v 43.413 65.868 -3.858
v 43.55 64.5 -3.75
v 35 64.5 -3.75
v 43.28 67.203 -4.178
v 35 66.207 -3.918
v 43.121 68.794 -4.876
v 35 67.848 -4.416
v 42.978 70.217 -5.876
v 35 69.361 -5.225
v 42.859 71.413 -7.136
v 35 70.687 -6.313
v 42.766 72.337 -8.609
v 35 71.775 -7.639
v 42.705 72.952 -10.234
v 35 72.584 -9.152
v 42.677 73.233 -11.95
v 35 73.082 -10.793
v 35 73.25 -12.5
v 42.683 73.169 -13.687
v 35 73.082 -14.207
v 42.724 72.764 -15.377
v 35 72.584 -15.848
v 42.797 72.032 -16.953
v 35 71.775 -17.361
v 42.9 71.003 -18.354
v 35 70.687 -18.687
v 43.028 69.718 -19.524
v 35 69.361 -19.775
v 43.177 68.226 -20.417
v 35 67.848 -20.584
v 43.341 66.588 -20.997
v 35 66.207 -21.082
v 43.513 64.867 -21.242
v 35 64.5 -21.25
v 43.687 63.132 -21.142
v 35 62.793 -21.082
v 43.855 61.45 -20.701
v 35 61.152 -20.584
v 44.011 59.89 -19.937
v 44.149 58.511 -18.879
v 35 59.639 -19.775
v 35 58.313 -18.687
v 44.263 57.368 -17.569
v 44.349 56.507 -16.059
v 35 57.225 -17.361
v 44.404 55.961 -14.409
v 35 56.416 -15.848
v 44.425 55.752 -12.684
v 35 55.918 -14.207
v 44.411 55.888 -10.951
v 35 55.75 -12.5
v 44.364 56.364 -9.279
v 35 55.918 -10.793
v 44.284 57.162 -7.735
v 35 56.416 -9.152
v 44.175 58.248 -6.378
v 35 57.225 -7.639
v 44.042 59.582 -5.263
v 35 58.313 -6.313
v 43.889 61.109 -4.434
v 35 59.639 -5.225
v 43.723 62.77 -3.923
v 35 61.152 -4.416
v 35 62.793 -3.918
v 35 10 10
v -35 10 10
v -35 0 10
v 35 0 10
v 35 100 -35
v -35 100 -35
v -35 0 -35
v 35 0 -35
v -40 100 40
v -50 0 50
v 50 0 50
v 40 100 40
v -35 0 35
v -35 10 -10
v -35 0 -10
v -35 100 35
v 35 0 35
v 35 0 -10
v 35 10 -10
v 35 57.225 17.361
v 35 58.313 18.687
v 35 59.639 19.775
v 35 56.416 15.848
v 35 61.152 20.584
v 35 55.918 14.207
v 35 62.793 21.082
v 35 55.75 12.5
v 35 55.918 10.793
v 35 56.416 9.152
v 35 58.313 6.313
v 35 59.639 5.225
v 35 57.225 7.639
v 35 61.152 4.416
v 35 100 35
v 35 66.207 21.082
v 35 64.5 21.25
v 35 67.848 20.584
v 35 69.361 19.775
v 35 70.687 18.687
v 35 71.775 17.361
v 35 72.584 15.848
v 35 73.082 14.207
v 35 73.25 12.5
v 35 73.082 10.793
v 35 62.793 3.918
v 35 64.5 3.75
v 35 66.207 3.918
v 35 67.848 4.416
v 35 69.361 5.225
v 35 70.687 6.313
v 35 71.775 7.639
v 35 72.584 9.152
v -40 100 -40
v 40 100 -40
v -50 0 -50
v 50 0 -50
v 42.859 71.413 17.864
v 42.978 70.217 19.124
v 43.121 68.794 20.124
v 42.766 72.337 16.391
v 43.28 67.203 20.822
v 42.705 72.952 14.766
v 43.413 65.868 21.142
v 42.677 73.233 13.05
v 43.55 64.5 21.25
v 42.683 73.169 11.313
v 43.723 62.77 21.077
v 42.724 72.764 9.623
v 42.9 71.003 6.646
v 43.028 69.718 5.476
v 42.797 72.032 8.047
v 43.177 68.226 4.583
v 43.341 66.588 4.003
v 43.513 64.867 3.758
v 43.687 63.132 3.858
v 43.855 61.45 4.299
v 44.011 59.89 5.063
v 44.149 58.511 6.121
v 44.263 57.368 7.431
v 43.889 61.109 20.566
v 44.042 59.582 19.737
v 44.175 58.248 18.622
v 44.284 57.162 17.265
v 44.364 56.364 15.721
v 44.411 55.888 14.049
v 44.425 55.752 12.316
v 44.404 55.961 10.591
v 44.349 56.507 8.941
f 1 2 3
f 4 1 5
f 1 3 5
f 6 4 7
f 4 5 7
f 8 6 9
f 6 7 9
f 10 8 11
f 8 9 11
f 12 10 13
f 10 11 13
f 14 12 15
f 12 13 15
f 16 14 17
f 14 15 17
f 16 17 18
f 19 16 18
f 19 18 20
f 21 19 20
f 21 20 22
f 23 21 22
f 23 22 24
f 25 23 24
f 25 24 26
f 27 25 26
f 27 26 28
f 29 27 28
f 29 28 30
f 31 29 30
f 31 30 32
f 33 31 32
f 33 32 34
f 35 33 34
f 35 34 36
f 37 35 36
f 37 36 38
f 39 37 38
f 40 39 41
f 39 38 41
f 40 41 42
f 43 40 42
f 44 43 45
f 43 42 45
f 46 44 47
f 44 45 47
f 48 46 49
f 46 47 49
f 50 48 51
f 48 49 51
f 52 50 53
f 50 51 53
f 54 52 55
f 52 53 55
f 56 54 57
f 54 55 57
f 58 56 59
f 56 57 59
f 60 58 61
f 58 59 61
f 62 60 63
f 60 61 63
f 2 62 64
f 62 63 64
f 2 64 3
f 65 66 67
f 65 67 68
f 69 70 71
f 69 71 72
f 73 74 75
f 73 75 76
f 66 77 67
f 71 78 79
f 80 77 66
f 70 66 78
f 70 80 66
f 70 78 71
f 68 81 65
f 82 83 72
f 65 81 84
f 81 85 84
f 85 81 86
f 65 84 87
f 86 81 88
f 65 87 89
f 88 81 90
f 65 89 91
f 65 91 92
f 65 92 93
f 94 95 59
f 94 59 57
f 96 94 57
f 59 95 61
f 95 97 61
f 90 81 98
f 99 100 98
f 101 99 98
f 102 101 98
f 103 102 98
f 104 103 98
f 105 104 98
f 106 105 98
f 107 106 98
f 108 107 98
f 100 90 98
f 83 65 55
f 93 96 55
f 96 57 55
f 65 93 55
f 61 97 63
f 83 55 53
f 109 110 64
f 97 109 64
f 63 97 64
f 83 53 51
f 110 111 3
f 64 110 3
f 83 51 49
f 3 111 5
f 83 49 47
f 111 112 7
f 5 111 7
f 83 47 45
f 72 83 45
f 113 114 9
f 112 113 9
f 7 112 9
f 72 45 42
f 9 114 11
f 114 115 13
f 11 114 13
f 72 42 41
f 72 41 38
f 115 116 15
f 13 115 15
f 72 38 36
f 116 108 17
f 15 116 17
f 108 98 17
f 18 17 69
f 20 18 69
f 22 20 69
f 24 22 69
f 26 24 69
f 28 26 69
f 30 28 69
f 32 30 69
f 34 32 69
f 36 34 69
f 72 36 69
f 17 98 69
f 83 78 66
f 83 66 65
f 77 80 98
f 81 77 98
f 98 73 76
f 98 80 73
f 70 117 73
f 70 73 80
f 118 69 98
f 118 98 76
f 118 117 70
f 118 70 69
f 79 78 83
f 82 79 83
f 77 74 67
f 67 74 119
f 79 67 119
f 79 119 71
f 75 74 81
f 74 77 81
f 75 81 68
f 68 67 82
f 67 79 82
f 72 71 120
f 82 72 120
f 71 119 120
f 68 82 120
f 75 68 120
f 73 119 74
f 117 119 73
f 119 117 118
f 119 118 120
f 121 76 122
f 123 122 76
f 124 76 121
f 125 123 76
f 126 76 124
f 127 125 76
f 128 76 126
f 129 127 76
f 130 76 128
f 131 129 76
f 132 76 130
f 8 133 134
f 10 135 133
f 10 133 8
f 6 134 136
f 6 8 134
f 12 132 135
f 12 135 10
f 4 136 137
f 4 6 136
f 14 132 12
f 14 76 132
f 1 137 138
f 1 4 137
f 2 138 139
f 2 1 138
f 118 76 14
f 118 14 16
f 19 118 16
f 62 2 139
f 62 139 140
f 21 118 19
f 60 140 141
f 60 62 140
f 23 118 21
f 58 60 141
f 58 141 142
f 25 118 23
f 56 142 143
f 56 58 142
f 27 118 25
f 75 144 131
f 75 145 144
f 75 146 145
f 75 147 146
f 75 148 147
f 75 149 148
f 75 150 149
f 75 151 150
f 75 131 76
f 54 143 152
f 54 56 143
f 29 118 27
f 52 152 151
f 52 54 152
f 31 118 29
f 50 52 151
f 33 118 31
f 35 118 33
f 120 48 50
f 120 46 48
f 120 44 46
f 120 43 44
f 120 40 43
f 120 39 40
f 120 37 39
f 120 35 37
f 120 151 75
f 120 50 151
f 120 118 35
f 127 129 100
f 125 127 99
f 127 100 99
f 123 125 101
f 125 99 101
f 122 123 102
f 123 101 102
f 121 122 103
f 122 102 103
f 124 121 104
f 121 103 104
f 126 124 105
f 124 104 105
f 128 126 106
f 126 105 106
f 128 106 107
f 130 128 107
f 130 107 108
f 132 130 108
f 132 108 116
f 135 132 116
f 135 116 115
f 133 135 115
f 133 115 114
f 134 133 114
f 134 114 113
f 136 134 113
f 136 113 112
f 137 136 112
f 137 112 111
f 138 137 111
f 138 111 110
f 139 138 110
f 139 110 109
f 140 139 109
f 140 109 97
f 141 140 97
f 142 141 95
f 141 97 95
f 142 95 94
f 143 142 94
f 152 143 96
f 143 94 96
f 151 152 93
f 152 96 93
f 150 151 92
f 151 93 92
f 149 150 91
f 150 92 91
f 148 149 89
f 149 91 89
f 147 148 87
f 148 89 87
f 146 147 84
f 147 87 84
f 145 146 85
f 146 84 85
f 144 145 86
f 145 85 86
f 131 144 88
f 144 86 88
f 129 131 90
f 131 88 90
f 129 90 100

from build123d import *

# Parameters (mm, degrees)
ESBO_O1_W                = 100
ESBO_O1_H                = 100
RESSALTO_EXTRUS_O1_DEPTH = 100
CHANFRO1_START           = -50
CHANFRO1_DEPTH           = 100
CHANFRO1_START_2         = -51
CHANFRO1_2_DEPTH         = 102
ESBO_O3_W                = 70
ESBO_O3_H                = 25
CORTE_EXTRUS_O1_DEPTH    = 123.474487139
ESBO_O4_W                = 70
ESBO_O4_H                = 20
CORTE_EXTRUS_O2_DEPTH    = 90
ESBO_O8_R                = 8.75
CORTE_EXTRUS_O6_DEPTH    = 141.445719052


with BuildPart() as part:
    # Esboço1 → Ressalto-extrusão1 (new body)
    with BuildSketch(Plane(origin=(0, 0, 0), x_dir=(1, 0, 0), z_dir=(0, 1, 0))):
        Rectangle(ESBO_O1_W, ESBO_O1_H)
    extrude(amount=RESSALTO_EXTRUS_O1_DEPTH)

    # Chanfro1: read off the stored shape, not the designer's step
    # Chanfro1 outline → Chanfro1 (cut)
    with BuildSketch(Plane.XY.offset(CHANFRO1_START)):
        Polygon((-50, 0), (-40, 100), (-50, 100), align=None)
        Polygon((40, 100), (50, 0), (50, 100), align=None)
    extrude(amount=CHANFRO1_DEPTH, mode=Mode.SUBTRACT)

    # Chanfro1 2 outline → Chanfro1 2 (cut)
    with BuildSketch(Plane.YZ.offset(CHANFRO1_START_2)):
        Polygon((0, 50), (100, 40), (100, 50), align=None)
        Polygon((100, -40), (0, -50), (100, -50), align=None)
    extrude(amount=CHANFRO1_2_DEPTH, mode=Mode.SUBTRACT)

    # Esboço3 → Corte-extrusão1 (cut, through all)
    with BuildSketch(Plane(origin=(0, 100, 0), x_dir=(1, 0, 0), z_dir=(0, 1, 0))):
        with Locations((0, 22.5)):
            Rectangle(ESBO_O3_W, ESBO_O3_H)
        with Locations((0, -22.5)):
            Rectangle(ESBO_O3_W, ESBO_O3_H)
    extrude(amount=-CORTE_EXTRUS_O1_DEPTH, mode=Mode.SUBTRACT)

    # Esboço4 → Corte-extrusão2 (cut)
    with BuildSketch(Plane(origin=(0, 100, 0), x_dir=(1, 0, 0), z_dir=(0, 1, 0))):
        Rectangle(ESBO_O4_W, ESBO_O4_H)
    extrude(amount=-CORTE_EXTRUS_O2_DEPTH, mode=Mode.SUBTRACT)

    # Esboço8 → Corte-extrusão6 (cut, through all)
    with BuildSketch(Plane.ZY.offset(-35)):
        with Locations((12.5, 64.5)):
            Circle(ESBO_O8_R)
        with Locations((-12.5, 64.5)):
            Circle(ESBO_O8_R)
    extrude(amount=-CORTE_EXTRUS_O6_DEPTH, mode=Mode.SUBTRACT)


solid = part.part
